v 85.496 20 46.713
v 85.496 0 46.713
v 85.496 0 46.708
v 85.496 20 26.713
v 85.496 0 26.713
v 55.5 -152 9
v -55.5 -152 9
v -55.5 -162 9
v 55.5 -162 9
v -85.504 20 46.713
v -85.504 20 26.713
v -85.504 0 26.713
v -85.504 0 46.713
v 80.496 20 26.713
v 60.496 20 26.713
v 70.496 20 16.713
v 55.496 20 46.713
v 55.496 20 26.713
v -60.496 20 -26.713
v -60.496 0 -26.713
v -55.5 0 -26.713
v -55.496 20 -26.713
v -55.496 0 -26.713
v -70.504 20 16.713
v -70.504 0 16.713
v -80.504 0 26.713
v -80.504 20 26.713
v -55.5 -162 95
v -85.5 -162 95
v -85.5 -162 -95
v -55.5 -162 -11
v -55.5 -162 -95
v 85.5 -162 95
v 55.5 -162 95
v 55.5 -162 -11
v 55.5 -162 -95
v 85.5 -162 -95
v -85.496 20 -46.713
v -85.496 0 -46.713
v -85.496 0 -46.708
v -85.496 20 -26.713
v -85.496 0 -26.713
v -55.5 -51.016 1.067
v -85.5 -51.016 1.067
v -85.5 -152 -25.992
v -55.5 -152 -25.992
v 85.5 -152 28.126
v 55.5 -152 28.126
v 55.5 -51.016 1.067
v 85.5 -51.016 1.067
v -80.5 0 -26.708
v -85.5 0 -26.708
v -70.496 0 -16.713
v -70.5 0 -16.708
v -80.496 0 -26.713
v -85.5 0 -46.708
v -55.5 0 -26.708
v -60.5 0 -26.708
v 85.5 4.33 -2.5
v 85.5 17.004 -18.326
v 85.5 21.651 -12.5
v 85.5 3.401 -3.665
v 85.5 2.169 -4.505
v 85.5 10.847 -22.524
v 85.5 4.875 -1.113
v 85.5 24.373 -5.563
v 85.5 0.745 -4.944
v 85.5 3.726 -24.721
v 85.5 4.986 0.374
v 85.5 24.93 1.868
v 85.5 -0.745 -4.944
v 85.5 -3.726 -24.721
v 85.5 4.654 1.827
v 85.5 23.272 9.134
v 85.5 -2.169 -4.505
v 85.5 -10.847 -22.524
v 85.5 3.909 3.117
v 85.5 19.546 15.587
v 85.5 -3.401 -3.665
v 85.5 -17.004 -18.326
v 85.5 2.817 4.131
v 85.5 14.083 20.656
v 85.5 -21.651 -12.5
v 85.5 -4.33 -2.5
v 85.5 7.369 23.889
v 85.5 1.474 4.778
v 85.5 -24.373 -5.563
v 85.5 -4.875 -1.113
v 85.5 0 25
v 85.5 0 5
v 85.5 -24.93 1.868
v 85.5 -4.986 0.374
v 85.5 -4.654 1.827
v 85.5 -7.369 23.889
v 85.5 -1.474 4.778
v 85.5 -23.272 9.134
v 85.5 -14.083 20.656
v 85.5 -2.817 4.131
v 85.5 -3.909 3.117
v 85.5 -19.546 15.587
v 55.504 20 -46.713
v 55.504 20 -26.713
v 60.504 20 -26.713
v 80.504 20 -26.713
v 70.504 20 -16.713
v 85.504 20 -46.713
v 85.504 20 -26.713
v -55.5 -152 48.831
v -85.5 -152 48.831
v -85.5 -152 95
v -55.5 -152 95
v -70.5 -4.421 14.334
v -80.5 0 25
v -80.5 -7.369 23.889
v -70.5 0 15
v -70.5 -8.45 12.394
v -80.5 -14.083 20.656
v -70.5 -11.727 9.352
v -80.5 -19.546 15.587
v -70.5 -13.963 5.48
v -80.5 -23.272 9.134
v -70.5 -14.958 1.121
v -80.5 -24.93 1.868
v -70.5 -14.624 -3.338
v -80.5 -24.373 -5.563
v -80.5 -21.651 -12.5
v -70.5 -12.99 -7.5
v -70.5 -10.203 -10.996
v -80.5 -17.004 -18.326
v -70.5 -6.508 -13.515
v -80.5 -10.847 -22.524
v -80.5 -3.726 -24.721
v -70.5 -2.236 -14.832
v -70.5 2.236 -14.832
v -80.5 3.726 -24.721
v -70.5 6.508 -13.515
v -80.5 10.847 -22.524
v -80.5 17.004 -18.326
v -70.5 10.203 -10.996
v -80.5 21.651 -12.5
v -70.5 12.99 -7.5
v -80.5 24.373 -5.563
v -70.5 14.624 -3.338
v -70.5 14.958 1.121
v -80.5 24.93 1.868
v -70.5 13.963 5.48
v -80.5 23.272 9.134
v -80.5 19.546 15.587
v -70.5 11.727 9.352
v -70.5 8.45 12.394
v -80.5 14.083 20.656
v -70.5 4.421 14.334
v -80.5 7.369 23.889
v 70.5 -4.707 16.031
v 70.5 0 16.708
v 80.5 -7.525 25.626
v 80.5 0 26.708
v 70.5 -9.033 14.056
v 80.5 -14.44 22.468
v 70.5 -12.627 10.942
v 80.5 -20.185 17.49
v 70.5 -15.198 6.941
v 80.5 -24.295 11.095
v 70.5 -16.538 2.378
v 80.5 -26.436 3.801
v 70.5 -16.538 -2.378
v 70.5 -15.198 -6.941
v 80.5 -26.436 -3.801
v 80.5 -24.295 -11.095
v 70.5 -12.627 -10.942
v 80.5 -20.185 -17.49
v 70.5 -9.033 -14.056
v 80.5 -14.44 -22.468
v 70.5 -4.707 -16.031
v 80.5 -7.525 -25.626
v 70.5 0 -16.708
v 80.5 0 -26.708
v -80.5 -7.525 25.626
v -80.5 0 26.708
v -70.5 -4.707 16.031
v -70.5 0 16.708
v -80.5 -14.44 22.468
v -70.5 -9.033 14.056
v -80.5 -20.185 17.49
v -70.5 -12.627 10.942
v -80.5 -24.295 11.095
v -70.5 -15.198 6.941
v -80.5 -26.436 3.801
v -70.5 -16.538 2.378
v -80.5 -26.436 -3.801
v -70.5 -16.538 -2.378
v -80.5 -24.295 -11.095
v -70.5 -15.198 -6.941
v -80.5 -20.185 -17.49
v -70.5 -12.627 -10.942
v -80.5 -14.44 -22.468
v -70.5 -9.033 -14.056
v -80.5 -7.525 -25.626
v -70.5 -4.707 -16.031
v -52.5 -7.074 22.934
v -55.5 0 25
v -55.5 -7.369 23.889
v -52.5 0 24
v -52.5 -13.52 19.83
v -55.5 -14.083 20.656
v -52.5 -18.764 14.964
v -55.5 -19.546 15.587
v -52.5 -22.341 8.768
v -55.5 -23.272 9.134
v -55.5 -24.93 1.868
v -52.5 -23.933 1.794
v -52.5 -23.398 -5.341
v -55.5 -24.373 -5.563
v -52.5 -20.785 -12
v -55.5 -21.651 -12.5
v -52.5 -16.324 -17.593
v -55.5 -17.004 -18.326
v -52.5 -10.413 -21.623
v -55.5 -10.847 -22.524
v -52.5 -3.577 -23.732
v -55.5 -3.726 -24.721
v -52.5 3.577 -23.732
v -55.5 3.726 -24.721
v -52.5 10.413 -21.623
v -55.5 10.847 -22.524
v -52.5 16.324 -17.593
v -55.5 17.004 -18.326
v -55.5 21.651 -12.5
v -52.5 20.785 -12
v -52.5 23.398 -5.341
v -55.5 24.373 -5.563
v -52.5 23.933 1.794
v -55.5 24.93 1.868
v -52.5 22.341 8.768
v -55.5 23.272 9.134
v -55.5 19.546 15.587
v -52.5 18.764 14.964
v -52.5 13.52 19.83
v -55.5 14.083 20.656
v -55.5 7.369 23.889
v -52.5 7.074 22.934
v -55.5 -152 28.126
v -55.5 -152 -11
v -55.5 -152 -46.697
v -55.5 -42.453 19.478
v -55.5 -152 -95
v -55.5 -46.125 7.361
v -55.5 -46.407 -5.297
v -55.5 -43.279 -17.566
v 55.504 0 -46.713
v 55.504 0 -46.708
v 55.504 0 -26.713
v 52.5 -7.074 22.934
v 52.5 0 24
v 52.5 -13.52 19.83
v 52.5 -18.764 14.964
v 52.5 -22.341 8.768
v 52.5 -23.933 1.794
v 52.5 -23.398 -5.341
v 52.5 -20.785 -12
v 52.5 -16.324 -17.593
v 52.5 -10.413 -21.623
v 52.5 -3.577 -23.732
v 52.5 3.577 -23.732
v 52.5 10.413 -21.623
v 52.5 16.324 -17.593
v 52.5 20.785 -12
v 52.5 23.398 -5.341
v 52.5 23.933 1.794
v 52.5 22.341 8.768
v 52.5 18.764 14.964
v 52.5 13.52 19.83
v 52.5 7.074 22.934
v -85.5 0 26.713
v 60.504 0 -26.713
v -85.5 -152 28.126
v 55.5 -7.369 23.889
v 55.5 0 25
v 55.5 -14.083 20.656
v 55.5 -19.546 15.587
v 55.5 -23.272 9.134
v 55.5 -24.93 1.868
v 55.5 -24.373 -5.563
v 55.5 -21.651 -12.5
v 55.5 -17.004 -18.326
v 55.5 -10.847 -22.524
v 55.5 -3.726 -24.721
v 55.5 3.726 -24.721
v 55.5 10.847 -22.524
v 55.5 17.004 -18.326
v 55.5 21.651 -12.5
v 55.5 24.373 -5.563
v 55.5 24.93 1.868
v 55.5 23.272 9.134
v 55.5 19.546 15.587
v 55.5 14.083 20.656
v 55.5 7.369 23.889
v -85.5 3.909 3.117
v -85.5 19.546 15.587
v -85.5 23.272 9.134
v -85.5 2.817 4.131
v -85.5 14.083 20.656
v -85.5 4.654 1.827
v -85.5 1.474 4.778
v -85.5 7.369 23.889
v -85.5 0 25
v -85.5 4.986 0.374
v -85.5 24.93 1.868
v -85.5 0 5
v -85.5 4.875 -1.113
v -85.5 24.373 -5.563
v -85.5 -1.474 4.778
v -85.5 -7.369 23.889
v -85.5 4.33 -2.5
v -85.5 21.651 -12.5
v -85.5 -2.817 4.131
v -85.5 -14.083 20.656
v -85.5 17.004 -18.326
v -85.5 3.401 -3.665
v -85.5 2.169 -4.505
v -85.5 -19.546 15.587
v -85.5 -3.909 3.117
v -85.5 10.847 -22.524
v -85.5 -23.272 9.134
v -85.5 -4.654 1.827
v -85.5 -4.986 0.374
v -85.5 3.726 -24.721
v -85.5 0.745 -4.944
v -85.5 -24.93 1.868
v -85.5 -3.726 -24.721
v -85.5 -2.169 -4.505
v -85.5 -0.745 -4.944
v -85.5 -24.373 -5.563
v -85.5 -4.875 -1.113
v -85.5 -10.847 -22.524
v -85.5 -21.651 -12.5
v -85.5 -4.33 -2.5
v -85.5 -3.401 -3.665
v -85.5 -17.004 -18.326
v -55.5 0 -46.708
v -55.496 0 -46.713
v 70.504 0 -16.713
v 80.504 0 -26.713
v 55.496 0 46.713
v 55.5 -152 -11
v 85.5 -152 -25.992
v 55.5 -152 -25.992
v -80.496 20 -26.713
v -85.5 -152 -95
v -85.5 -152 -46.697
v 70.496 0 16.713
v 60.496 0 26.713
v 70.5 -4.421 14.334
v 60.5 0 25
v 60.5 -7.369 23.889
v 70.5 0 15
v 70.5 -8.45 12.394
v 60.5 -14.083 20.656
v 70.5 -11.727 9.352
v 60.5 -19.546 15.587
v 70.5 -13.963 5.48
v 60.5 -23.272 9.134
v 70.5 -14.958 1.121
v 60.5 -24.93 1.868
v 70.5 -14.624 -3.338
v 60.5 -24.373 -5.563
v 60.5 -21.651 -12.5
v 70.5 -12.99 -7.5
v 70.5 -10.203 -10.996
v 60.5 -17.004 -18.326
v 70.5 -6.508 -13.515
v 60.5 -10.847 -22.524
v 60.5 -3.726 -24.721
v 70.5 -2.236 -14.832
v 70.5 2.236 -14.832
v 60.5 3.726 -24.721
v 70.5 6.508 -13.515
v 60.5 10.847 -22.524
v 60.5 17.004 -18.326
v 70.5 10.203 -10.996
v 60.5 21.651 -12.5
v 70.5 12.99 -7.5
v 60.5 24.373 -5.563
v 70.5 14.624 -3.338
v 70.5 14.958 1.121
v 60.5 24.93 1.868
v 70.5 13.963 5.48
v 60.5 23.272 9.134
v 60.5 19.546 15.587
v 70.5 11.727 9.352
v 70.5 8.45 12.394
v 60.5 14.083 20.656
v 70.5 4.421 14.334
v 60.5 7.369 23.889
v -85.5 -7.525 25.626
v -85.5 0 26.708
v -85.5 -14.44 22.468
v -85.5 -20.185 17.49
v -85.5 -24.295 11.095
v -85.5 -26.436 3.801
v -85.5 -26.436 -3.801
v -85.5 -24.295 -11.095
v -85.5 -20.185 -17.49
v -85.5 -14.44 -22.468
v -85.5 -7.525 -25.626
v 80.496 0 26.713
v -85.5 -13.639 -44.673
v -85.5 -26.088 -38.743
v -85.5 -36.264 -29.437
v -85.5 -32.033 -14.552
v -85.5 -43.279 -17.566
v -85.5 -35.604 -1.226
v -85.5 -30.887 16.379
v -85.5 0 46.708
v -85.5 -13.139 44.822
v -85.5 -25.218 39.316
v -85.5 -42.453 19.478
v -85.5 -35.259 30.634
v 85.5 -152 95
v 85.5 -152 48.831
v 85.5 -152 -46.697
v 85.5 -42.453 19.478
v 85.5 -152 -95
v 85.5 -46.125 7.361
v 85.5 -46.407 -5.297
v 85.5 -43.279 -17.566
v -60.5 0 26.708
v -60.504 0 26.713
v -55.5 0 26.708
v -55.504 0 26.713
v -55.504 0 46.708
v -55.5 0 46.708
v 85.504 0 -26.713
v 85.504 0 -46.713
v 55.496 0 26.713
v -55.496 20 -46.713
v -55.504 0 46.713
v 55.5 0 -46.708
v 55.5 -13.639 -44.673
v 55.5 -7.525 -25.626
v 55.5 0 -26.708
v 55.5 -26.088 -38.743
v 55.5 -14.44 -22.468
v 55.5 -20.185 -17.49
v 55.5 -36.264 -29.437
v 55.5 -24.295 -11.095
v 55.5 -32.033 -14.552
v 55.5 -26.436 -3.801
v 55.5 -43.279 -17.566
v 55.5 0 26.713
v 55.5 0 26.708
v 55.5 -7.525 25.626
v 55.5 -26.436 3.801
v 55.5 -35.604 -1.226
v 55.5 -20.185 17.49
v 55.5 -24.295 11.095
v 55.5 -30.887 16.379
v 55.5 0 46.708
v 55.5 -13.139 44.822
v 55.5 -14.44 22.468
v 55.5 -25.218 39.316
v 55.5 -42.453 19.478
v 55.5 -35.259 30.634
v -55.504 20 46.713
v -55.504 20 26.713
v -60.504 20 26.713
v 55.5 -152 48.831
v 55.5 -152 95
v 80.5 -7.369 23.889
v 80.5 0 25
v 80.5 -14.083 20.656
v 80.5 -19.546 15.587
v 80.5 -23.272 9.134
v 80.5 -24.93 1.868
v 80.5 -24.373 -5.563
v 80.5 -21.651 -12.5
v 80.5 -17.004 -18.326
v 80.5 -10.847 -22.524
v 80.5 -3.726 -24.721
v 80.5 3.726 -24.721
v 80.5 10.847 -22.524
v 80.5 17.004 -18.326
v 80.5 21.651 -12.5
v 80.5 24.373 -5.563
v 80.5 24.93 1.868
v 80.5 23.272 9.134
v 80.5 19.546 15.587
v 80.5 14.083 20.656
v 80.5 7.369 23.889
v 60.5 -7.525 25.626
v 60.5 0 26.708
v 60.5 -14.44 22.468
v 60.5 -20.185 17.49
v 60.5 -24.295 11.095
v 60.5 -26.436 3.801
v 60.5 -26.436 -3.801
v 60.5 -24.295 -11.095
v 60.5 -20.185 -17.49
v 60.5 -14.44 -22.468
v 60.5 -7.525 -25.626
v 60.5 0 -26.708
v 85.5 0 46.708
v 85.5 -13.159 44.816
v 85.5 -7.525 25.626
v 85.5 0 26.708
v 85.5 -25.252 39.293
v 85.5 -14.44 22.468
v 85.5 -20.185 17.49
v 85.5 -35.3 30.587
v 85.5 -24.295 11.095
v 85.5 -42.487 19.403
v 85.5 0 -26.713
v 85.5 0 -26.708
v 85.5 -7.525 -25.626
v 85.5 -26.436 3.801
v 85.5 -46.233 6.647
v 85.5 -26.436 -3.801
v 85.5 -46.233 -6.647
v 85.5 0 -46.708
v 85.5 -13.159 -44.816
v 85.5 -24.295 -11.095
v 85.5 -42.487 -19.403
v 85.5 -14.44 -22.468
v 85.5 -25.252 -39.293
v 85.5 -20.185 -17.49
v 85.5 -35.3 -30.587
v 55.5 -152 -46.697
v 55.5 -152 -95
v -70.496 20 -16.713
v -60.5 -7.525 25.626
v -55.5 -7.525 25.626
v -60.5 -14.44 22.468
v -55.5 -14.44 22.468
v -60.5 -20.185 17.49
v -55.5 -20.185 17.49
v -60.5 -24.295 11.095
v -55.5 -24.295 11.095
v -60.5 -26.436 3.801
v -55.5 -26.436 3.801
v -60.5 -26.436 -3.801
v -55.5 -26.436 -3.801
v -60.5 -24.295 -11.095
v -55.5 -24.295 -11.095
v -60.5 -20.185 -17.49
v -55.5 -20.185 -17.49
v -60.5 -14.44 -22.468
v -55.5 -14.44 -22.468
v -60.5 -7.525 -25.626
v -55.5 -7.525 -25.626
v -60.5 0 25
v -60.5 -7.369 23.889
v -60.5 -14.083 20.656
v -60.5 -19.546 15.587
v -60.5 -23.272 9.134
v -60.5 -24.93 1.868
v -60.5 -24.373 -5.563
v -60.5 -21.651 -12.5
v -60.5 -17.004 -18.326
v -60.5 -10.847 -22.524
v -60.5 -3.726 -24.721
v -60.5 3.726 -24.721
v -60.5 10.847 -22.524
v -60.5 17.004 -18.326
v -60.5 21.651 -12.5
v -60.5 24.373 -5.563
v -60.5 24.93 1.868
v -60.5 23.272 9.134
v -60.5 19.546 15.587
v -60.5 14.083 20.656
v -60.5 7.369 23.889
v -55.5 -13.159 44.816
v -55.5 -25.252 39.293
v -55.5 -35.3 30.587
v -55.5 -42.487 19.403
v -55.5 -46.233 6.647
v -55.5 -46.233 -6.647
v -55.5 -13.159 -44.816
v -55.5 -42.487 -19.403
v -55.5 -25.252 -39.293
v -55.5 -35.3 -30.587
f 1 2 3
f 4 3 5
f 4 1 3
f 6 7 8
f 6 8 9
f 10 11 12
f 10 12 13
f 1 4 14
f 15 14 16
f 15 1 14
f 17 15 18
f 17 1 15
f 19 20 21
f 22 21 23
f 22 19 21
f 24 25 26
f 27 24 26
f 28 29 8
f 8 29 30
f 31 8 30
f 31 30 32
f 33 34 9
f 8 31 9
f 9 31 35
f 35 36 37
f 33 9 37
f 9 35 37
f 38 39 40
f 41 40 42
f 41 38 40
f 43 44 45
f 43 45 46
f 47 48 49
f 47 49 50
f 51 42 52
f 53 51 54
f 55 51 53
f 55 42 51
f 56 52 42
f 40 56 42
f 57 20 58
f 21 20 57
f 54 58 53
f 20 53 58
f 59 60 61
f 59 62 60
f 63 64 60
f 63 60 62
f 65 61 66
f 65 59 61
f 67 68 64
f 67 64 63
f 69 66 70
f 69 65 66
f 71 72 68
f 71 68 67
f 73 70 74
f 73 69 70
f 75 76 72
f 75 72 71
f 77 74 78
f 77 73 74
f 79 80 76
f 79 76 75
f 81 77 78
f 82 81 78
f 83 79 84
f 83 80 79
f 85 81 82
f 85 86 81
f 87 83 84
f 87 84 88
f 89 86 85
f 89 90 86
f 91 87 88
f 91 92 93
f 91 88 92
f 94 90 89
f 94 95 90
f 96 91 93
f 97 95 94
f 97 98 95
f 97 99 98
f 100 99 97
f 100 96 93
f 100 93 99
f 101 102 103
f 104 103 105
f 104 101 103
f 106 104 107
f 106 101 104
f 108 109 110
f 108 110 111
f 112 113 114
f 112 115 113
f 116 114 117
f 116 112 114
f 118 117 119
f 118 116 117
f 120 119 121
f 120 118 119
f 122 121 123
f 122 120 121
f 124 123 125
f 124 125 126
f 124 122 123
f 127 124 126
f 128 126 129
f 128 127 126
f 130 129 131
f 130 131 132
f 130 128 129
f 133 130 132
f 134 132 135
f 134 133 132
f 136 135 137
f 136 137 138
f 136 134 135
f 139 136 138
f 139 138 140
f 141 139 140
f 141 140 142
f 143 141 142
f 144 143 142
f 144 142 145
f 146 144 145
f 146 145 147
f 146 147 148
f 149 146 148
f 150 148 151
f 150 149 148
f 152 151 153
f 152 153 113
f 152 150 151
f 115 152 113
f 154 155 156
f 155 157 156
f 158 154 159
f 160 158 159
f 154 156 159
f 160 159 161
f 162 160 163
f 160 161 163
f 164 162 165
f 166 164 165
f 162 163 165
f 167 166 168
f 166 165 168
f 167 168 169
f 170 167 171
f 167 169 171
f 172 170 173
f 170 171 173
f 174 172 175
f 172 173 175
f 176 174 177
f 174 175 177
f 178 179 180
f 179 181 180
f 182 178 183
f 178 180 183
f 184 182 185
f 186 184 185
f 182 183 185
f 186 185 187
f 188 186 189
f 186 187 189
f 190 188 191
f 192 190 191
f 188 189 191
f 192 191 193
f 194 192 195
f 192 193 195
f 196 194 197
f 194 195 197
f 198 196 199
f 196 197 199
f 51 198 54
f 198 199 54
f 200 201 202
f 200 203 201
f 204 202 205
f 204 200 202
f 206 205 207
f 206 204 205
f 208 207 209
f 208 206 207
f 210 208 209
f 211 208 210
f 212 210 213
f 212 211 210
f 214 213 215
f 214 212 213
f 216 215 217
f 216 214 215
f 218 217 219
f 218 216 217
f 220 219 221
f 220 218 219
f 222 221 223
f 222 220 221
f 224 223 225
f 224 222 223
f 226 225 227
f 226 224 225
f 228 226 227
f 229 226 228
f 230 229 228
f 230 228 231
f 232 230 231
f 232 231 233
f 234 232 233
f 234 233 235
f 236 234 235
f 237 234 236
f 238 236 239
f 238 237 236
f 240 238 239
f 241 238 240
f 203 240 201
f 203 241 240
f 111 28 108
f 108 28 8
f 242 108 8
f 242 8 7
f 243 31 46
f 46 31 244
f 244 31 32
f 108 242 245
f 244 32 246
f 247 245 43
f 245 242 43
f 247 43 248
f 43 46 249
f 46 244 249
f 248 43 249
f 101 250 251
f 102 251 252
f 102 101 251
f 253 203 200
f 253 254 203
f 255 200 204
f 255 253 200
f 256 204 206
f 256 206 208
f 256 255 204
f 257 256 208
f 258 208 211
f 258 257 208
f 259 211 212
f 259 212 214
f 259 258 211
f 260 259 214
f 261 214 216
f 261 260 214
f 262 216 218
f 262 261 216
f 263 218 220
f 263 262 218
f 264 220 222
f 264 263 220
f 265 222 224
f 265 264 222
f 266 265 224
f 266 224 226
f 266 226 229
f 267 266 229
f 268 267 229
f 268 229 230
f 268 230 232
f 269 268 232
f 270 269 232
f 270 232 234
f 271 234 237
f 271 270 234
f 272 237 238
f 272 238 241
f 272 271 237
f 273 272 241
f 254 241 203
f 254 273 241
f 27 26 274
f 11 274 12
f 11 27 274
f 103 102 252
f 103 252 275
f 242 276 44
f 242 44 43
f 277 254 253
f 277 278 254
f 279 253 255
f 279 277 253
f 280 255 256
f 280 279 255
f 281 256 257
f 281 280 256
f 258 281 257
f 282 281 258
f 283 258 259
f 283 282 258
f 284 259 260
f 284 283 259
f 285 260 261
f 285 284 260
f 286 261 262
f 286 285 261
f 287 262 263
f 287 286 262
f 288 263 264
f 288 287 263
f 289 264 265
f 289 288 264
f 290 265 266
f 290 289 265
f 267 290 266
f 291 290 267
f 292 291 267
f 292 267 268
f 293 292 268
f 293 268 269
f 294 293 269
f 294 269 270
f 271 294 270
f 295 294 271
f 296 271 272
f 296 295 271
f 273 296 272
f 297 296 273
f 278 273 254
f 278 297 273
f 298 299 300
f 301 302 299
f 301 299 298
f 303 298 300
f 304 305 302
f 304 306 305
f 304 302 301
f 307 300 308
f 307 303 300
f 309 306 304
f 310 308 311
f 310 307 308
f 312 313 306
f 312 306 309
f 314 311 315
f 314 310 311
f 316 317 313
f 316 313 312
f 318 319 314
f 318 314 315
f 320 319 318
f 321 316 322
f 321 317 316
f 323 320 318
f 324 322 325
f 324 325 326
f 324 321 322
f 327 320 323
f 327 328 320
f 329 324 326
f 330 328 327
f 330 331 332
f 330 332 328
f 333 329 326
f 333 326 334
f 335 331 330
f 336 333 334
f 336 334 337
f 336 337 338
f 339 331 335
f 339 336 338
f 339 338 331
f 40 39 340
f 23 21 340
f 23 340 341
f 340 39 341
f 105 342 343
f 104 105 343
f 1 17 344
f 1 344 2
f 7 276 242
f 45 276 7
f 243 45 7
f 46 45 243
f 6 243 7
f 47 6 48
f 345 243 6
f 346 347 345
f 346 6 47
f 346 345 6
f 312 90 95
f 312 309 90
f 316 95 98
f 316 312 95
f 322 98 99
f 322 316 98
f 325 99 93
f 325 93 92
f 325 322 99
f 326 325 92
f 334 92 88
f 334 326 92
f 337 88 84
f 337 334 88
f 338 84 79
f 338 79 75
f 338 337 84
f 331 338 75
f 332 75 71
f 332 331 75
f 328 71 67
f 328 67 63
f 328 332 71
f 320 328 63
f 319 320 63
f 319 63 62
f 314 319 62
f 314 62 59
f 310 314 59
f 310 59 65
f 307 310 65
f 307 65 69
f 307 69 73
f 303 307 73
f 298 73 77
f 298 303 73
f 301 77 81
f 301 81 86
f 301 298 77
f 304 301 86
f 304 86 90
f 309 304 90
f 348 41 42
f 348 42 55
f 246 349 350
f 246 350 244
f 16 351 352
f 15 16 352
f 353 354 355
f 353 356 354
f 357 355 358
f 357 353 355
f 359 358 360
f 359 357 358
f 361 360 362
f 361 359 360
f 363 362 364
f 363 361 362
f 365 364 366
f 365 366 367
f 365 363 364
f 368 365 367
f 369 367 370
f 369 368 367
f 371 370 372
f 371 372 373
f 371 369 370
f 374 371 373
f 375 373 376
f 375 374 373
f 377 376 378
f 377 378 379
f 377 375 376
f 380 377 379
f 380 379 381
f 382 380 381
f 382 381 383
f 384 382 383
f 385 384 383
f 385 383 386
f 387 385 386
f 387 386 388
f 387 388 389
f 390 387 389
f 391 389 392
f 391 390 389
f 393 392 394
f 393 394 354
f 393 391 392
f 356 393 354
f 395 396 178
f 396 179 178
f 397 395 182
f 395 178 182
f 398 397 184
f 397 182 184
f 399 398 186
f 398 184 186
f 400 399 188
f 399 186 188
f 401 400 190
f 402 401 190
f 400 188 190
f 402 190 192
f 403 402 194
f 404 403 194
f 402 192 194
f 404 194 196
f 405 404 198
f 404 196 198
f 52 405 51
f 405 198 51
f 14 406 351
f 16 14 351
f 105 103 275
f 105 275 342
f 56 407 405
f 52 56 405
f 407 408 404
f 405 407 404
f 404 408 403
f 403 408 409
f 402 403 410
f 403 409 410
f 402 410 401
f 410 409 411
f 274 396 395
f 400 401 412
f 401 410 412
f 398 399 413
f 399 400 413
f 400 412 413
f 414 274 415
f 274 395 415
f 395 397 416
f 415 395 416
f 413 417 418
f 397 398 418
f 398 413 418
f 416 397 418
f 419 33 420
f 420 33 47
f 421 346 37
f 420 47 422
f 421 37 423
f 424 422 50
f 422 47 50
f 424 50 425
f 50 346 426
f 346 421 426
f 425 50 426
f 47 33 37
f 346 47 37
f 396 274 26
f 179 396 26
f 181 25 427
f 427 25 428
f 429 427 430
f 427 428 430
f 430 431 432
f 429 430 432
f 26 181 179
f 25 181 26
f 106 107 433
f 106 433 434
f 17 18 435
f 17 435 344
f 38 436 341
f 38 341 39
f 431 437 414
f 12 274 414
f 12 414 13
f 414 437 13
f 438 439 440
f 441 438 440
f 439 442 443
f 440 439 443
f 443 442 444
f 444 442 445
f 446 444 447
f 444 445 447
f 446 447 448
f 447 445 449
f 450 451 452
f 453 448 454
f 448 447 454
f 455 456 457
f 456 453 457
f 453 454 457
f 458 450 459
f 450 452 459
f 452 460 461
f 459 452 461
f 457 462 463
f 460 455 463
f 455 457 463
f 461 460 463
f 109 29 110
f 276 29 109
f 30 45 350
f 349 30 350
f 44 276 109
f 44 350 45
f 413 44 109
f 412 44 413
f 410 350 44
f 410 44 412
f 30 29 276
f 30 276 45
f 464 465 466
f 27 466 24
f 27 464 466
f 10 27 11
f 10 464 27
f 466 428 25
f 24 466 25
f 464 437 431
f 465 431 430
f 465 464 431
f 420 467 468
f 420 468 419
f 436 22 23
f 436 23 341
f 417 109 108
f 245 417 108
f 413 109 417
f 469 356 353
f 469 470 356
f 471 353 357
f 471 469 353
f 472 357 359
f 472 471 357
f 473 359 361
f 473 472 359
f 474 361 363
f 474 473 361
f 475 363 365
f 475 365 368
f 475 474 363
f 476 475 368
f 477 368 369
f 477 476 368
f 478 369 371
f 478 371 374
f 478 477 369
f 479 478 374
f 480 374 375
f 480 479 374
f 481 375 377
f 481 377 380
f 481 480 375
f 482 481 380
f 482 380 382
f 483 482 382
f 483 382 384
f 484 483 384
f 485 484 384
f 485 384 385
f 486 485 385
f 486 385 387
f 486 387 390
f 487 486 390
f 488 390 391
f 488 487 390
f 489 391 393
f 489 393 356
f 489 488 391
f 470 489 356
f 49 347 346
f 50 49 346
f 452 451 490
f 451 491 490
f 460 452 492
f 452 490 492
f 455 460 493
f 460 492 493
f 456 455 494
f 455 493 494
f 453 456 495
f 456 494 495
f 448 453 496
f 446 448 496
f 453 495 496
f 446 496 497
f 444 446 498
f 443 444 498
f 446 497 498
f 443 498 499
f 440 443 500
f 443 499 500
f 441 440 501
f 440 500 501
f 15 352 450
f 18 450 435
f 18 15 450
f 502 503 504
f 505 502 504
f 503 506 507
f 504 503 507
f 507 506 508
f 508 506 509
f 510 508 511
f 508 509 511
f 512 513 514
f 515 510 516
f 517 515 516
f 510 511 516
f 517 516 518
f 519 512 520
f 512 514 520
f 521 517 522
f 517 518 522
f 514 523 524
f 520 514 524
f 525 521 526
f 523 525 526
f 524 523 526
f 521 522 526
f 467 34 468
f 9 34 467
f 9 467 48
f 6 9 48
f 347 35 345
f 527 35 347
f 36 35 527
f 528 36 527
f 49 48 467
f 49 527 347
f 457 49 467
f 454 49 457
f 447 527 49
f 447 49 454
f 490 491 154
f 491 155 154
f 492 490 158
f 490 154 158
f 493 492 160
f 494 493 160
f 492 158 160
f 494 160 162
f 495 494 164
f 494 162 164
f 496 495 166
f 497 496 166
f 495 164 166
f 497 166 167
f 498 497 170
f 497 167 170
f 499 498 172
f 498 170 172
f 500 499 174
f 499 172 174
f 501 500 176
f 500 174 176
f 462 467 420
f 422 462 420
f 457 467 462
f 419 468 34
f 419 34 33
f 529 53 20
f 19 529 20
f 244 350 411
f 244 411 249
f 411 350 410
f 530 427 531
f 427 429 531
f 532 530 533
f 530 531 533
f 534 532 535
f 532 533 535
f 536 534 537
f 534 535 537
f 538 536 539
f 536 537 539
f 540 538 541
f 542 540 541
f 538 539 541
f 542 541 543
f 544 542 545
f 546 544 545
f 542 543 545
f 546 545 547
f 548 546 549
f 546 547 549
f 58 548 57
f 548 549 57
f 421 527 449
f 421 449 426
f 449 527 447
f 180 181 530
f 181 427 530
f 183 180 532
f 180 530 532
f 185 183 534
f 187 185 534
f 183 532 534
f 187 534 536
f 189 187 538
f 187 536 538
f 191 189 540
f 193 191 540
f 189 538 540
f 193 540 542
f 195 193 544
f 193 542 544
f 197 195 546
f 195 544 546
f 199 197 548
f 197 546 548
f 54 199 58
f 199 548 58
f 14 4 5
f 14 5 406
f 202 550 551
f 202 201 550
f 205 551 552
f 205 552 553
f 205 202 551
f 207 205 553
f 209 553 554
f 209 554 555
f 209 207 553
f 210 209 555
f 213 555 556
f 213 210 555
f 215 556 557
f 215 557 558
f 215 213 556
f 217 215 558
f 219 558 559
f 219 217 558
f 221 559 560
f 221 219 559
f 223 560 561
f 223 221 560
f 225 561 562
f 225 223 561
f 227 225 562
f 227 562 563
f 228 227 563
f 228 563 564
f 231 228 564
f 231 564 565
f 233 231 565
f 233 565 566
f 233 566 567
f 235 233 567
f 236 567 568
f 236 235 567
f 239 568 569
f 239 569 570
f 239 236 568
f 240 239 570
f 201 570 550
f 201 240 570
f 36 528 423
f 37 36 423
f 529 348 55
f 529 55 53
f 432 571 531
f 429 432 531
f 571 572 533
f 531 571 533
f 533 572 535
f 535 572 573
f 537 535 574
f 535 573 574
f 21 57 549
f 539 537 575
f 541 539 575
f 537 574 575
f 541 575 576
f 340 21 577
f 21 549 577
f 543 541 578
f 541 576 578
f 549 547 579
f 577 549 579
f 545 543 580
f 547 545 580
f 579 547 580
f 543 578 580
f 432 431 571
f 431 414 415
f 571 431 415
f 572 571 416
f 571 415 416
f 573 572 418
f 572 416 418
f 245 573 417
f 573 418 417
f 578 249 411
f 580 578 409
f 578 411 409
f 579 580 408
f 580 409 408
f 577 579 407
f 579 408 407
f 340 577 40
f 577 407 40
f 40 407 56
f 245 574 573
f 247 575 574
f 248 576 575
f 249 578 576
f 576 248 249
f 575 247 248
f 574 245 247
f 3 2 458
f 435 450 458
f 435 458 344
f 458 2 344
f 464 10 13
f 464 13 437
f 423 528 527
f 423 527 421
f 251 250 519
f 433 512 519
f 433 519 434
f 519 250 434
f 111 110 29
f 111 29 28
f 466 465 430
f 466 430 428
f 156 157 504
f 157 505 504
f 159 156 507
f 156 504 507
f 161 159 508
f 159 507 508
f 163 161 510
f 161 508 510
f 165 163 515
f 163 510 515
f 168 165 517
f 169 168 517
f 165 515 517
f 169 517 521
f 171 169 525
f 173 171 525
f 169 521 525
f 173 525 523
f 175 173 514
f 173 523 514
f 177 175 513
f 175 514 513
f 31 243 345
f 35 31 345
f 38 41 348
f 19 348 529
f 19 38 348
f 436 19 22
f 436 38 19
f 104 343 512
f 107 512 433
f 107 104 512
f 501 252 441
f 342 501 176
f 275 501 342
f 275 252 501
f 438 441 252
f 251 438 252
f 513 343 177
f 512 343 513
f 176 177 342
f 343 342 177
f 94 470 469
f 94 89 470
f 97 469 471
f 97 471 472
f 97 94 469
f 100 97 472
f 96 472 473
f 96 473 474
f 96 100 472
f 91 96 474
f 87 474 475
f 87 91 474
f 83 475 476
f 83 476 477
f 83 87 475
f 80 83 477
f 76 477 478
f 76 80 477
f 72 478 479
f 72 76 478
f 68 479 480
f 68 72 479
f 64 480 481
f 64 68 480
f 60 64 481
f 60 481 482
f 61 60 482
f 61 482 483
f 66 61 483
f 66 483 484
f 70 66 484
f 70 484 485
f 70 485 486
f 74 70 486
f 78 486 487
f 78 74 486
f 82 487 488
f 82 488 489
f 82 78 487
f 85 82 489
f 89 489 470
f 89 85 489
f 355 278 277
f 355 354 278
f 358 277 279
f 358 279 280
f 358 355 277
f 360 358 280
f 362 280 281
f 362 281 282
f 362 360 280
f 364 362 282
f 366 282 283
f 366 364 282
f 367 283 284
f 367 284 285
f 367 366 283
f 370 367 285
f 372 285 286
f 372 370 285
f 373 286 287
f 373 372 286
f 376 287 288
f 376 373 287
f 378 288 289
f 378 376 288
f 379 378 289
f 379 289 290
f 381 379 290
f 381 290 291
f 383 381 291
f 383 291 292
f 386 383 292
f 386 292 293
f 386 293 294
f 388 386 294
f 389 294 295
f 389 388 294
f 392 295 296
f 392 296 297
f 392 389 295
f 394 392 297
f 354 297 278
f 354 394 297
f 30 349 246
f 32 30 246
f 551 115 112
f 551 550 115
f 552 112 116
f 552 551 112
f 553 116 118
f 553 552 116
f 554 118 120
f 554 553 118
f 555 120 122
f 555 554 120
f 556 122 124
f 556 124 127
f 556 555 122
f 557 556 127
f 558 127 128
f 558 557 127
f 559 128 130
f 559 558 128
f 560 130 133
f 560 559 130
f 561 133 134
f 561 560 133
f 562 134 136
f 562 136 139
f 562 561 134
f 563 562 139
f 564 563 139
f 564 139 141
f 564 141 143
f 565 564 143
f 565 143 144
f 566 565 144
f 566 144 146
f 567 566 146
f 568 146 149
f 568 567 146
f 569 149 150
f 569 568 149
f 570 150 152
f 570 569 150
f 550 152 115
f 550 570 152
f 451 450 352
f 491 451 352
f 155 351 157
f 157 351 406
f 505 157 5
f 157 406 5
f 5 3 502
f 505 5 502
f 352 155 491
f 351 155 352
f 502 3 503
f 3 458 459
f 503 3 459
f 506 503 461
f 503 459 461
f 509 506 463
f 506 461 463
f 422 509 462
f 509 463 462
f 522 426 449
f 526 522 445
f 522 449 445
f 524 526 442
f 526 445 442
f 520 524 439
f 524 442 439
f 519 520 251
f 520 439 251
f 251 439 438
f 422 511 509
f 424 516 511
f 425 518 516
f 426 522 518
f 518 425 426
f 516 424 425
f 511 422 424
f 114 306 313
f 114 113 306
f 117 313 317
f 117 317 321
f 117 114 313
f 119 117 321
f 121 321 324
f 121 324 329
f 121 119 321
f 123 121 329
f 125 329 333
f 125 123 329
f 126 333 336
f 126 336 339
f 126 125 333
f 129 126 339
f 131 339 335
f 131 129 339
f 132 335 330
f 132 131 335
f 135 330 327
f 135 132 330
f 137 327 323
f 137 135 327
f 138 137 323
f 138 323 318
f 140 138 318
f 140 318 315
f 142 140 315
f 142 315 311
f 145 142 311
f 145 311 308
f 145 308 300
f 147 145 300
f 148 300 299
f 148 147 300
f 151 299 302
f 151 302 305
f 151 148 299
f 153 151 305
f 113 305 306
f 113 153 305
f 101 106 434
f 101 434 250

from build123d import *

# Parameters (mm, degrees)
BOX009_W                = 30
BOX009_H                = 10
BOX009_DEPTH            = 190
BOX004_W                = 30
BOX004_H                = 10
BOX004_DEPTH            = 190
BOX011_W                = 130
BOX011_H                = 10
BOX011_DEPTH            = 20
BOX018_W                = 40
BOX018_H                = 20
BOX018_DEPTH            = 220
BOX017_W                = 30
BOX017_H                = 140
BOX017_DEPTH            = 20
BOX017_PLACEMENT_ANGLE  = 15
BOX016_W                = 30
BOX016_H                = 140
BOX016_DEPTH            = 20
BOX016_PLACEMENT_ANGLE  = 15
PAD006_DEPTH            = 20
BODY011_PLACEMENT_ANGLE = 180
REVOLUTION004_ANGLE     = 180
PAD007_DEPTH            = 20
BOX015_W                = 40
BOX015_H                = 20
BOX015_DEPTH            = 220
BOX014_W                = 30
BOX014_H                = 140
BOX014_DEPTH            = 20
BOX014_PLACEMENT_ANGLE  = 15
BOX013_W                = 30
BOX013_H                = 140
BOX013_DEPTH            = 20
BOX013_PLACEMENT_ANGLE  = 15
PAD004_DEPTH            = 20
BODY008_PLACEMENT_ANGLE = 180
REVOLUTION003_ANGLE     = 180
PAD005_DEPTH            = 20


with BuildPart() as inner:
    # Sketch → Revolution (revolve)
    with BuildSketch(Plane.XZ):
        Polygon((-52.5, 24), (52.5, 24), (55.5, 25), (60.5, 25), (70.5, 15), (80.5, 25), (85.5, 25), (85.5, 5), (-85.5, 5), (-85.5, 25), (-80.5, 25), (-70.5, 15), (-60.5, 25), (-55.5, 25), align=None)
    revolve(axis=Axis((0, 0, 0), (1, 0, 0)))


with BuildPart() as cube009:
    # Box009 → Box009 (new body)
    with BuildSketch(Plane(origin=(55.5, -173, -95), x_dir=(1, 0, 0), z_dir=(0, 0, 1))):
        with Locations((15, 5)):
            Rectangle(BOX009_W, BOX009_H)
    extrude(amount=BOX009_DEPTH)


with BuildPart() as cube004:
    # Box004 → Box004 (new body)
    with BuildSketch(Plane(origin=(-85.5, -173, -95), x_dir=(1, 0, 0), z_dir=(0, 0, 1))):
        with Locations((15, 5)):
            Rectangle(BOX004_W, BOX004_H)
    extrude(amount=BOX004_DEPTH)


with BuildPart() as fusion:
    # Box011 → Box011 (new body)
    with BuildSketch(Plane(origin=(-63, -173, -11), x_dir=(1, 0, 0), z_dir=(0, 0, 1))):
        with Locations((65, 5)):
            Rectangle(BOX011_W, BOX011_H)
    extrude(amount=BOX011_DEPTH)

    # Fusion: union Cube009, Cube004
    add(cube009.part)
    add(cube004.part)


with BuildPart() as fusion_1:
    # Fusion placement: moved
    add(fusion.part.moved(Location((0, 11, 0))))


with BuildPart() as cube018:
    # Box018 → Box018 (new body)
    with BuildSketch(Plane(origin=(-94, -173, -109), x_dir=(1, 0, 0), z_dir=(0, 0, 1))):
        with Locations((20, 10)):
            Rectangle(BOX018_W, BOX018_H)
    extrude(amount=BOX018_DEPTH)


with BuildPart() as cube017:
    # Box017 → Box017 (new body)
    with BuildSketch(Plane.XY):
        with Locations((15, 70)):
            Rectangle(BOX017_W, BOX017_H)
    extrude(amount=BOX017_DEPTH)


with BuildPart() as cube017_1:
    # Box017 placement: moved
    add(cube017.part.moved(Location((-85.5, -167.262928, -50.786773))).rotate(Axis((-85.5, -167.262928, -50.786773), (1, 0, 0)), BOX017_PLACEMENT_ANGLE))


with BuildPart() as cube016:
    # Box016 → Box016 (new body)
    with BuildSketch(Plane.XY):
        with Locations((15, 70)):
            Rectangle(BOX016_W, BOX016_H)
    extrude(amount=BOX016_DEPTH)


with BuildPart() as cube016_1:
    # Box016 placement: moved
    add(cube016.part.moved(Location((-85.5, -171.292547, 33.2952))).rotate(Axis((-85.5, -171.292547, 33.2952), (-1, 0, 0)), BOX016_PLACEMENT_ANGLE))


with BuildPart() as body011:
    # Sketch011 → Pad006 (new body)
    with BuildSketch(Plane.XZ):
        Polygon((-160.153853, 40.532615), (-130.153853, 40.532615), (-130.153853, 20.532615), (-135.153853, 20.532615), (-145.153853, 10.532615), (-155.153853, 20.532615), (-160.153853, 20.532615), align=None)
    extrude(amount=PAD006_DEPTH)


with BuildPart() as body011_1:
    # Body011 placement: moved
    add(body011.part.moved(Location((-215.65, 20, -6.18))).rotate(Axis((-215.65, 20, -6.18), (0, 1, 0)), BODY011_PLACEMENT_ANGLE))


with BuildPart() as fusion017:
    # Sketch010 → Revolution004 (revolve)
    with BuildSketch(Plane.XZ):
        Polygon((-85.499998, 26.708255), (-80.499998, 26.708255), (-70.499998, 16.708255), (-60.499998, 26.708255), (-55.499998, 26.708255), (-55.499998, 46.708255), (-85.499998, 46.708255), align=None)
    revolve(axis=Axis((0, 0, 0), (1, 0, 0)), revolution_arc=REVOLUTION004_ANGLE)

    # Fusion017: union Body011
    add(body011_1.part)


with BuildPart() as cut002:
    # Sketch012 → Pad007 (new body)
    with BuildSketch(Plane.XZ):
        Polygon((-160.153853, 40.532615), (-130.153853, 40.532615), (-130.153853, 20.532615), (-135.153853, 20.532615), (-145.153853, 10.532615), (-155.153853, 20.532615), (-160.153853, 20.532615), align=None)
    extrude(amount=PAD007_DEPTH)


with BuildPart() as cut002_1:
    # Body012 placement: moved
    add(cut002.part.moved(Location((74.65, 20, 6.18))))

    # Fusion018: union Fusion017
    add(fusion017.part)

    # Fusion019: union Cube017, Cube016
    add(cube017_1.part)
    add(cube016_1.part)

    # Cut002: cut Cube018
    add(cube018.part, mode=Mode.SUBTRACT)


with BuildPart() as cut002_2:
    # Cut002 placement: moved
    add(cut002_1.part.moved(Location((141, 0, 0))))


with BuildPart() as cube015:
    # Box015 → Box015 (new body)
    with BuildSketch(Plane(origin=(-94, -173, -109), x_dir=(1, 0, 0), z_dir=(0, 0, 1))):
        with Locations((20, 10)):
            Rectangle(BOX015_W, BOX015_H)
    extrude(amount=BOX015_DEPTH)


with BuildPart() as cube014:
    # Box014 → Box014 (new body)
    with BuildSketch(Plane.XY):
        with Locations((15, 70)):
            Rectangle(BOX014_W, BOX014_H)
    extrude(amount=BOX014_DEPTH)


with BuildPart() as cube014_1:
    # Box014 placement: moved
    add(cube014.part.moved(Location((-85.5, -167.262928, -50.786773))).rotate(Axis((-85.5, -167.262928, -50.786773), (1, 0, 0)), BOX014_PLACEMENT_ANGLE))


with BuildPart() as cube013:
    # Box013 → Box013 (new body)
    with BuildSketch(Plane.XY):
        with Locations((15, 70)):
            Rectangle(BOX013_W, BOX013_H)
    extrude(amount=BOX013_DEPTH)


with BuildPart() as cube013_1:
    # Box013 placement: moved
    add(cube013.part.moved(Location((-85.5, -171.292547, 33.2952))).rotate(Axis((-85.5, -171.292547, 33.2952), (-1, 0, 0)), BOX013_PLACEMENT_ANGLE))


with BuildPart() as body008:
    # Sketch008 → Pad004 (new body)
    with BuildSketch(Plane.XZ):
        Polygon((-160.153853, 40.532615), (-130.153853, 40.532615), (-130.153853, 20.532615), (-135.153853, 20.532615), (-145.153853, 10.532615), (-155.153853, 20.532615), (-160.153853, 20.532615), align=None)
    extrude(amount=PAD004_DEPTH)


with BuildPart() as body008_1:
    # Body008 placement: moved
    add(body008.part.moved(Location((-215.65, 20, -6.18))).rotate(Axis((-215.65, 20, -6.18), (0, 1, 0)), BODY008_PLACEMENT_ANGLE))


with BuildPart() as fusion010:
    # Sketch007 → Revolution003 (revolve)
    with BuildSketch(Plane.XZ):
        Polygon((-85.499998, 26.708255), (-80.499998, 26.708255), (-70.499998, 16.708255), (-60.499998, 26.708255), (-55.499998, 26.708255), (-55.499998, 46.708255), (-85.499998, 46.708255), align=None)
    revolve(axis=Axis((0, 0, 0), (1, 0, 0)), revolution_arc=REVOLUTION003_ANGLE)

    # Fusion010: union Body008
    add(body008_1.part)


with BuildPart() as fusion020:
    # Sketch009 → Pad005 (new body)
    with BuildSketch(Plane.XZ):
        Polygon((-160.153853, 40.532615), (-130.153853, 40.532615), (-130.153853, 20.532615), (-135.153853, 20.532615), (-145.153853, 10.532615), (-155.153853, 20.532615), (-160.153853, 20.532615), align=None)
    extrude(amount=PAD005_DEPTH)


with BuildPart() as fusion020_1:
    # Body009 placement: moved
    add(fusion020.part.moved(Location((74.65, 20, 6.18))))

    # Fusion011: union Fusion010
    add(fusion010.part)

    # Fusion016: union Cube014, Cube013
    add(cube014_1.part)
    add(cube013_1.part)

    # Cut001: cut Cube015
    add(cube015.part, mode=Mode.SUBTRACT)

    # Fusion020: union Fusion, Cut002
    add(fusion_1.part)
    add(cut002_2.part)


solid = Compound([inner.part, fusion020_1.part])
